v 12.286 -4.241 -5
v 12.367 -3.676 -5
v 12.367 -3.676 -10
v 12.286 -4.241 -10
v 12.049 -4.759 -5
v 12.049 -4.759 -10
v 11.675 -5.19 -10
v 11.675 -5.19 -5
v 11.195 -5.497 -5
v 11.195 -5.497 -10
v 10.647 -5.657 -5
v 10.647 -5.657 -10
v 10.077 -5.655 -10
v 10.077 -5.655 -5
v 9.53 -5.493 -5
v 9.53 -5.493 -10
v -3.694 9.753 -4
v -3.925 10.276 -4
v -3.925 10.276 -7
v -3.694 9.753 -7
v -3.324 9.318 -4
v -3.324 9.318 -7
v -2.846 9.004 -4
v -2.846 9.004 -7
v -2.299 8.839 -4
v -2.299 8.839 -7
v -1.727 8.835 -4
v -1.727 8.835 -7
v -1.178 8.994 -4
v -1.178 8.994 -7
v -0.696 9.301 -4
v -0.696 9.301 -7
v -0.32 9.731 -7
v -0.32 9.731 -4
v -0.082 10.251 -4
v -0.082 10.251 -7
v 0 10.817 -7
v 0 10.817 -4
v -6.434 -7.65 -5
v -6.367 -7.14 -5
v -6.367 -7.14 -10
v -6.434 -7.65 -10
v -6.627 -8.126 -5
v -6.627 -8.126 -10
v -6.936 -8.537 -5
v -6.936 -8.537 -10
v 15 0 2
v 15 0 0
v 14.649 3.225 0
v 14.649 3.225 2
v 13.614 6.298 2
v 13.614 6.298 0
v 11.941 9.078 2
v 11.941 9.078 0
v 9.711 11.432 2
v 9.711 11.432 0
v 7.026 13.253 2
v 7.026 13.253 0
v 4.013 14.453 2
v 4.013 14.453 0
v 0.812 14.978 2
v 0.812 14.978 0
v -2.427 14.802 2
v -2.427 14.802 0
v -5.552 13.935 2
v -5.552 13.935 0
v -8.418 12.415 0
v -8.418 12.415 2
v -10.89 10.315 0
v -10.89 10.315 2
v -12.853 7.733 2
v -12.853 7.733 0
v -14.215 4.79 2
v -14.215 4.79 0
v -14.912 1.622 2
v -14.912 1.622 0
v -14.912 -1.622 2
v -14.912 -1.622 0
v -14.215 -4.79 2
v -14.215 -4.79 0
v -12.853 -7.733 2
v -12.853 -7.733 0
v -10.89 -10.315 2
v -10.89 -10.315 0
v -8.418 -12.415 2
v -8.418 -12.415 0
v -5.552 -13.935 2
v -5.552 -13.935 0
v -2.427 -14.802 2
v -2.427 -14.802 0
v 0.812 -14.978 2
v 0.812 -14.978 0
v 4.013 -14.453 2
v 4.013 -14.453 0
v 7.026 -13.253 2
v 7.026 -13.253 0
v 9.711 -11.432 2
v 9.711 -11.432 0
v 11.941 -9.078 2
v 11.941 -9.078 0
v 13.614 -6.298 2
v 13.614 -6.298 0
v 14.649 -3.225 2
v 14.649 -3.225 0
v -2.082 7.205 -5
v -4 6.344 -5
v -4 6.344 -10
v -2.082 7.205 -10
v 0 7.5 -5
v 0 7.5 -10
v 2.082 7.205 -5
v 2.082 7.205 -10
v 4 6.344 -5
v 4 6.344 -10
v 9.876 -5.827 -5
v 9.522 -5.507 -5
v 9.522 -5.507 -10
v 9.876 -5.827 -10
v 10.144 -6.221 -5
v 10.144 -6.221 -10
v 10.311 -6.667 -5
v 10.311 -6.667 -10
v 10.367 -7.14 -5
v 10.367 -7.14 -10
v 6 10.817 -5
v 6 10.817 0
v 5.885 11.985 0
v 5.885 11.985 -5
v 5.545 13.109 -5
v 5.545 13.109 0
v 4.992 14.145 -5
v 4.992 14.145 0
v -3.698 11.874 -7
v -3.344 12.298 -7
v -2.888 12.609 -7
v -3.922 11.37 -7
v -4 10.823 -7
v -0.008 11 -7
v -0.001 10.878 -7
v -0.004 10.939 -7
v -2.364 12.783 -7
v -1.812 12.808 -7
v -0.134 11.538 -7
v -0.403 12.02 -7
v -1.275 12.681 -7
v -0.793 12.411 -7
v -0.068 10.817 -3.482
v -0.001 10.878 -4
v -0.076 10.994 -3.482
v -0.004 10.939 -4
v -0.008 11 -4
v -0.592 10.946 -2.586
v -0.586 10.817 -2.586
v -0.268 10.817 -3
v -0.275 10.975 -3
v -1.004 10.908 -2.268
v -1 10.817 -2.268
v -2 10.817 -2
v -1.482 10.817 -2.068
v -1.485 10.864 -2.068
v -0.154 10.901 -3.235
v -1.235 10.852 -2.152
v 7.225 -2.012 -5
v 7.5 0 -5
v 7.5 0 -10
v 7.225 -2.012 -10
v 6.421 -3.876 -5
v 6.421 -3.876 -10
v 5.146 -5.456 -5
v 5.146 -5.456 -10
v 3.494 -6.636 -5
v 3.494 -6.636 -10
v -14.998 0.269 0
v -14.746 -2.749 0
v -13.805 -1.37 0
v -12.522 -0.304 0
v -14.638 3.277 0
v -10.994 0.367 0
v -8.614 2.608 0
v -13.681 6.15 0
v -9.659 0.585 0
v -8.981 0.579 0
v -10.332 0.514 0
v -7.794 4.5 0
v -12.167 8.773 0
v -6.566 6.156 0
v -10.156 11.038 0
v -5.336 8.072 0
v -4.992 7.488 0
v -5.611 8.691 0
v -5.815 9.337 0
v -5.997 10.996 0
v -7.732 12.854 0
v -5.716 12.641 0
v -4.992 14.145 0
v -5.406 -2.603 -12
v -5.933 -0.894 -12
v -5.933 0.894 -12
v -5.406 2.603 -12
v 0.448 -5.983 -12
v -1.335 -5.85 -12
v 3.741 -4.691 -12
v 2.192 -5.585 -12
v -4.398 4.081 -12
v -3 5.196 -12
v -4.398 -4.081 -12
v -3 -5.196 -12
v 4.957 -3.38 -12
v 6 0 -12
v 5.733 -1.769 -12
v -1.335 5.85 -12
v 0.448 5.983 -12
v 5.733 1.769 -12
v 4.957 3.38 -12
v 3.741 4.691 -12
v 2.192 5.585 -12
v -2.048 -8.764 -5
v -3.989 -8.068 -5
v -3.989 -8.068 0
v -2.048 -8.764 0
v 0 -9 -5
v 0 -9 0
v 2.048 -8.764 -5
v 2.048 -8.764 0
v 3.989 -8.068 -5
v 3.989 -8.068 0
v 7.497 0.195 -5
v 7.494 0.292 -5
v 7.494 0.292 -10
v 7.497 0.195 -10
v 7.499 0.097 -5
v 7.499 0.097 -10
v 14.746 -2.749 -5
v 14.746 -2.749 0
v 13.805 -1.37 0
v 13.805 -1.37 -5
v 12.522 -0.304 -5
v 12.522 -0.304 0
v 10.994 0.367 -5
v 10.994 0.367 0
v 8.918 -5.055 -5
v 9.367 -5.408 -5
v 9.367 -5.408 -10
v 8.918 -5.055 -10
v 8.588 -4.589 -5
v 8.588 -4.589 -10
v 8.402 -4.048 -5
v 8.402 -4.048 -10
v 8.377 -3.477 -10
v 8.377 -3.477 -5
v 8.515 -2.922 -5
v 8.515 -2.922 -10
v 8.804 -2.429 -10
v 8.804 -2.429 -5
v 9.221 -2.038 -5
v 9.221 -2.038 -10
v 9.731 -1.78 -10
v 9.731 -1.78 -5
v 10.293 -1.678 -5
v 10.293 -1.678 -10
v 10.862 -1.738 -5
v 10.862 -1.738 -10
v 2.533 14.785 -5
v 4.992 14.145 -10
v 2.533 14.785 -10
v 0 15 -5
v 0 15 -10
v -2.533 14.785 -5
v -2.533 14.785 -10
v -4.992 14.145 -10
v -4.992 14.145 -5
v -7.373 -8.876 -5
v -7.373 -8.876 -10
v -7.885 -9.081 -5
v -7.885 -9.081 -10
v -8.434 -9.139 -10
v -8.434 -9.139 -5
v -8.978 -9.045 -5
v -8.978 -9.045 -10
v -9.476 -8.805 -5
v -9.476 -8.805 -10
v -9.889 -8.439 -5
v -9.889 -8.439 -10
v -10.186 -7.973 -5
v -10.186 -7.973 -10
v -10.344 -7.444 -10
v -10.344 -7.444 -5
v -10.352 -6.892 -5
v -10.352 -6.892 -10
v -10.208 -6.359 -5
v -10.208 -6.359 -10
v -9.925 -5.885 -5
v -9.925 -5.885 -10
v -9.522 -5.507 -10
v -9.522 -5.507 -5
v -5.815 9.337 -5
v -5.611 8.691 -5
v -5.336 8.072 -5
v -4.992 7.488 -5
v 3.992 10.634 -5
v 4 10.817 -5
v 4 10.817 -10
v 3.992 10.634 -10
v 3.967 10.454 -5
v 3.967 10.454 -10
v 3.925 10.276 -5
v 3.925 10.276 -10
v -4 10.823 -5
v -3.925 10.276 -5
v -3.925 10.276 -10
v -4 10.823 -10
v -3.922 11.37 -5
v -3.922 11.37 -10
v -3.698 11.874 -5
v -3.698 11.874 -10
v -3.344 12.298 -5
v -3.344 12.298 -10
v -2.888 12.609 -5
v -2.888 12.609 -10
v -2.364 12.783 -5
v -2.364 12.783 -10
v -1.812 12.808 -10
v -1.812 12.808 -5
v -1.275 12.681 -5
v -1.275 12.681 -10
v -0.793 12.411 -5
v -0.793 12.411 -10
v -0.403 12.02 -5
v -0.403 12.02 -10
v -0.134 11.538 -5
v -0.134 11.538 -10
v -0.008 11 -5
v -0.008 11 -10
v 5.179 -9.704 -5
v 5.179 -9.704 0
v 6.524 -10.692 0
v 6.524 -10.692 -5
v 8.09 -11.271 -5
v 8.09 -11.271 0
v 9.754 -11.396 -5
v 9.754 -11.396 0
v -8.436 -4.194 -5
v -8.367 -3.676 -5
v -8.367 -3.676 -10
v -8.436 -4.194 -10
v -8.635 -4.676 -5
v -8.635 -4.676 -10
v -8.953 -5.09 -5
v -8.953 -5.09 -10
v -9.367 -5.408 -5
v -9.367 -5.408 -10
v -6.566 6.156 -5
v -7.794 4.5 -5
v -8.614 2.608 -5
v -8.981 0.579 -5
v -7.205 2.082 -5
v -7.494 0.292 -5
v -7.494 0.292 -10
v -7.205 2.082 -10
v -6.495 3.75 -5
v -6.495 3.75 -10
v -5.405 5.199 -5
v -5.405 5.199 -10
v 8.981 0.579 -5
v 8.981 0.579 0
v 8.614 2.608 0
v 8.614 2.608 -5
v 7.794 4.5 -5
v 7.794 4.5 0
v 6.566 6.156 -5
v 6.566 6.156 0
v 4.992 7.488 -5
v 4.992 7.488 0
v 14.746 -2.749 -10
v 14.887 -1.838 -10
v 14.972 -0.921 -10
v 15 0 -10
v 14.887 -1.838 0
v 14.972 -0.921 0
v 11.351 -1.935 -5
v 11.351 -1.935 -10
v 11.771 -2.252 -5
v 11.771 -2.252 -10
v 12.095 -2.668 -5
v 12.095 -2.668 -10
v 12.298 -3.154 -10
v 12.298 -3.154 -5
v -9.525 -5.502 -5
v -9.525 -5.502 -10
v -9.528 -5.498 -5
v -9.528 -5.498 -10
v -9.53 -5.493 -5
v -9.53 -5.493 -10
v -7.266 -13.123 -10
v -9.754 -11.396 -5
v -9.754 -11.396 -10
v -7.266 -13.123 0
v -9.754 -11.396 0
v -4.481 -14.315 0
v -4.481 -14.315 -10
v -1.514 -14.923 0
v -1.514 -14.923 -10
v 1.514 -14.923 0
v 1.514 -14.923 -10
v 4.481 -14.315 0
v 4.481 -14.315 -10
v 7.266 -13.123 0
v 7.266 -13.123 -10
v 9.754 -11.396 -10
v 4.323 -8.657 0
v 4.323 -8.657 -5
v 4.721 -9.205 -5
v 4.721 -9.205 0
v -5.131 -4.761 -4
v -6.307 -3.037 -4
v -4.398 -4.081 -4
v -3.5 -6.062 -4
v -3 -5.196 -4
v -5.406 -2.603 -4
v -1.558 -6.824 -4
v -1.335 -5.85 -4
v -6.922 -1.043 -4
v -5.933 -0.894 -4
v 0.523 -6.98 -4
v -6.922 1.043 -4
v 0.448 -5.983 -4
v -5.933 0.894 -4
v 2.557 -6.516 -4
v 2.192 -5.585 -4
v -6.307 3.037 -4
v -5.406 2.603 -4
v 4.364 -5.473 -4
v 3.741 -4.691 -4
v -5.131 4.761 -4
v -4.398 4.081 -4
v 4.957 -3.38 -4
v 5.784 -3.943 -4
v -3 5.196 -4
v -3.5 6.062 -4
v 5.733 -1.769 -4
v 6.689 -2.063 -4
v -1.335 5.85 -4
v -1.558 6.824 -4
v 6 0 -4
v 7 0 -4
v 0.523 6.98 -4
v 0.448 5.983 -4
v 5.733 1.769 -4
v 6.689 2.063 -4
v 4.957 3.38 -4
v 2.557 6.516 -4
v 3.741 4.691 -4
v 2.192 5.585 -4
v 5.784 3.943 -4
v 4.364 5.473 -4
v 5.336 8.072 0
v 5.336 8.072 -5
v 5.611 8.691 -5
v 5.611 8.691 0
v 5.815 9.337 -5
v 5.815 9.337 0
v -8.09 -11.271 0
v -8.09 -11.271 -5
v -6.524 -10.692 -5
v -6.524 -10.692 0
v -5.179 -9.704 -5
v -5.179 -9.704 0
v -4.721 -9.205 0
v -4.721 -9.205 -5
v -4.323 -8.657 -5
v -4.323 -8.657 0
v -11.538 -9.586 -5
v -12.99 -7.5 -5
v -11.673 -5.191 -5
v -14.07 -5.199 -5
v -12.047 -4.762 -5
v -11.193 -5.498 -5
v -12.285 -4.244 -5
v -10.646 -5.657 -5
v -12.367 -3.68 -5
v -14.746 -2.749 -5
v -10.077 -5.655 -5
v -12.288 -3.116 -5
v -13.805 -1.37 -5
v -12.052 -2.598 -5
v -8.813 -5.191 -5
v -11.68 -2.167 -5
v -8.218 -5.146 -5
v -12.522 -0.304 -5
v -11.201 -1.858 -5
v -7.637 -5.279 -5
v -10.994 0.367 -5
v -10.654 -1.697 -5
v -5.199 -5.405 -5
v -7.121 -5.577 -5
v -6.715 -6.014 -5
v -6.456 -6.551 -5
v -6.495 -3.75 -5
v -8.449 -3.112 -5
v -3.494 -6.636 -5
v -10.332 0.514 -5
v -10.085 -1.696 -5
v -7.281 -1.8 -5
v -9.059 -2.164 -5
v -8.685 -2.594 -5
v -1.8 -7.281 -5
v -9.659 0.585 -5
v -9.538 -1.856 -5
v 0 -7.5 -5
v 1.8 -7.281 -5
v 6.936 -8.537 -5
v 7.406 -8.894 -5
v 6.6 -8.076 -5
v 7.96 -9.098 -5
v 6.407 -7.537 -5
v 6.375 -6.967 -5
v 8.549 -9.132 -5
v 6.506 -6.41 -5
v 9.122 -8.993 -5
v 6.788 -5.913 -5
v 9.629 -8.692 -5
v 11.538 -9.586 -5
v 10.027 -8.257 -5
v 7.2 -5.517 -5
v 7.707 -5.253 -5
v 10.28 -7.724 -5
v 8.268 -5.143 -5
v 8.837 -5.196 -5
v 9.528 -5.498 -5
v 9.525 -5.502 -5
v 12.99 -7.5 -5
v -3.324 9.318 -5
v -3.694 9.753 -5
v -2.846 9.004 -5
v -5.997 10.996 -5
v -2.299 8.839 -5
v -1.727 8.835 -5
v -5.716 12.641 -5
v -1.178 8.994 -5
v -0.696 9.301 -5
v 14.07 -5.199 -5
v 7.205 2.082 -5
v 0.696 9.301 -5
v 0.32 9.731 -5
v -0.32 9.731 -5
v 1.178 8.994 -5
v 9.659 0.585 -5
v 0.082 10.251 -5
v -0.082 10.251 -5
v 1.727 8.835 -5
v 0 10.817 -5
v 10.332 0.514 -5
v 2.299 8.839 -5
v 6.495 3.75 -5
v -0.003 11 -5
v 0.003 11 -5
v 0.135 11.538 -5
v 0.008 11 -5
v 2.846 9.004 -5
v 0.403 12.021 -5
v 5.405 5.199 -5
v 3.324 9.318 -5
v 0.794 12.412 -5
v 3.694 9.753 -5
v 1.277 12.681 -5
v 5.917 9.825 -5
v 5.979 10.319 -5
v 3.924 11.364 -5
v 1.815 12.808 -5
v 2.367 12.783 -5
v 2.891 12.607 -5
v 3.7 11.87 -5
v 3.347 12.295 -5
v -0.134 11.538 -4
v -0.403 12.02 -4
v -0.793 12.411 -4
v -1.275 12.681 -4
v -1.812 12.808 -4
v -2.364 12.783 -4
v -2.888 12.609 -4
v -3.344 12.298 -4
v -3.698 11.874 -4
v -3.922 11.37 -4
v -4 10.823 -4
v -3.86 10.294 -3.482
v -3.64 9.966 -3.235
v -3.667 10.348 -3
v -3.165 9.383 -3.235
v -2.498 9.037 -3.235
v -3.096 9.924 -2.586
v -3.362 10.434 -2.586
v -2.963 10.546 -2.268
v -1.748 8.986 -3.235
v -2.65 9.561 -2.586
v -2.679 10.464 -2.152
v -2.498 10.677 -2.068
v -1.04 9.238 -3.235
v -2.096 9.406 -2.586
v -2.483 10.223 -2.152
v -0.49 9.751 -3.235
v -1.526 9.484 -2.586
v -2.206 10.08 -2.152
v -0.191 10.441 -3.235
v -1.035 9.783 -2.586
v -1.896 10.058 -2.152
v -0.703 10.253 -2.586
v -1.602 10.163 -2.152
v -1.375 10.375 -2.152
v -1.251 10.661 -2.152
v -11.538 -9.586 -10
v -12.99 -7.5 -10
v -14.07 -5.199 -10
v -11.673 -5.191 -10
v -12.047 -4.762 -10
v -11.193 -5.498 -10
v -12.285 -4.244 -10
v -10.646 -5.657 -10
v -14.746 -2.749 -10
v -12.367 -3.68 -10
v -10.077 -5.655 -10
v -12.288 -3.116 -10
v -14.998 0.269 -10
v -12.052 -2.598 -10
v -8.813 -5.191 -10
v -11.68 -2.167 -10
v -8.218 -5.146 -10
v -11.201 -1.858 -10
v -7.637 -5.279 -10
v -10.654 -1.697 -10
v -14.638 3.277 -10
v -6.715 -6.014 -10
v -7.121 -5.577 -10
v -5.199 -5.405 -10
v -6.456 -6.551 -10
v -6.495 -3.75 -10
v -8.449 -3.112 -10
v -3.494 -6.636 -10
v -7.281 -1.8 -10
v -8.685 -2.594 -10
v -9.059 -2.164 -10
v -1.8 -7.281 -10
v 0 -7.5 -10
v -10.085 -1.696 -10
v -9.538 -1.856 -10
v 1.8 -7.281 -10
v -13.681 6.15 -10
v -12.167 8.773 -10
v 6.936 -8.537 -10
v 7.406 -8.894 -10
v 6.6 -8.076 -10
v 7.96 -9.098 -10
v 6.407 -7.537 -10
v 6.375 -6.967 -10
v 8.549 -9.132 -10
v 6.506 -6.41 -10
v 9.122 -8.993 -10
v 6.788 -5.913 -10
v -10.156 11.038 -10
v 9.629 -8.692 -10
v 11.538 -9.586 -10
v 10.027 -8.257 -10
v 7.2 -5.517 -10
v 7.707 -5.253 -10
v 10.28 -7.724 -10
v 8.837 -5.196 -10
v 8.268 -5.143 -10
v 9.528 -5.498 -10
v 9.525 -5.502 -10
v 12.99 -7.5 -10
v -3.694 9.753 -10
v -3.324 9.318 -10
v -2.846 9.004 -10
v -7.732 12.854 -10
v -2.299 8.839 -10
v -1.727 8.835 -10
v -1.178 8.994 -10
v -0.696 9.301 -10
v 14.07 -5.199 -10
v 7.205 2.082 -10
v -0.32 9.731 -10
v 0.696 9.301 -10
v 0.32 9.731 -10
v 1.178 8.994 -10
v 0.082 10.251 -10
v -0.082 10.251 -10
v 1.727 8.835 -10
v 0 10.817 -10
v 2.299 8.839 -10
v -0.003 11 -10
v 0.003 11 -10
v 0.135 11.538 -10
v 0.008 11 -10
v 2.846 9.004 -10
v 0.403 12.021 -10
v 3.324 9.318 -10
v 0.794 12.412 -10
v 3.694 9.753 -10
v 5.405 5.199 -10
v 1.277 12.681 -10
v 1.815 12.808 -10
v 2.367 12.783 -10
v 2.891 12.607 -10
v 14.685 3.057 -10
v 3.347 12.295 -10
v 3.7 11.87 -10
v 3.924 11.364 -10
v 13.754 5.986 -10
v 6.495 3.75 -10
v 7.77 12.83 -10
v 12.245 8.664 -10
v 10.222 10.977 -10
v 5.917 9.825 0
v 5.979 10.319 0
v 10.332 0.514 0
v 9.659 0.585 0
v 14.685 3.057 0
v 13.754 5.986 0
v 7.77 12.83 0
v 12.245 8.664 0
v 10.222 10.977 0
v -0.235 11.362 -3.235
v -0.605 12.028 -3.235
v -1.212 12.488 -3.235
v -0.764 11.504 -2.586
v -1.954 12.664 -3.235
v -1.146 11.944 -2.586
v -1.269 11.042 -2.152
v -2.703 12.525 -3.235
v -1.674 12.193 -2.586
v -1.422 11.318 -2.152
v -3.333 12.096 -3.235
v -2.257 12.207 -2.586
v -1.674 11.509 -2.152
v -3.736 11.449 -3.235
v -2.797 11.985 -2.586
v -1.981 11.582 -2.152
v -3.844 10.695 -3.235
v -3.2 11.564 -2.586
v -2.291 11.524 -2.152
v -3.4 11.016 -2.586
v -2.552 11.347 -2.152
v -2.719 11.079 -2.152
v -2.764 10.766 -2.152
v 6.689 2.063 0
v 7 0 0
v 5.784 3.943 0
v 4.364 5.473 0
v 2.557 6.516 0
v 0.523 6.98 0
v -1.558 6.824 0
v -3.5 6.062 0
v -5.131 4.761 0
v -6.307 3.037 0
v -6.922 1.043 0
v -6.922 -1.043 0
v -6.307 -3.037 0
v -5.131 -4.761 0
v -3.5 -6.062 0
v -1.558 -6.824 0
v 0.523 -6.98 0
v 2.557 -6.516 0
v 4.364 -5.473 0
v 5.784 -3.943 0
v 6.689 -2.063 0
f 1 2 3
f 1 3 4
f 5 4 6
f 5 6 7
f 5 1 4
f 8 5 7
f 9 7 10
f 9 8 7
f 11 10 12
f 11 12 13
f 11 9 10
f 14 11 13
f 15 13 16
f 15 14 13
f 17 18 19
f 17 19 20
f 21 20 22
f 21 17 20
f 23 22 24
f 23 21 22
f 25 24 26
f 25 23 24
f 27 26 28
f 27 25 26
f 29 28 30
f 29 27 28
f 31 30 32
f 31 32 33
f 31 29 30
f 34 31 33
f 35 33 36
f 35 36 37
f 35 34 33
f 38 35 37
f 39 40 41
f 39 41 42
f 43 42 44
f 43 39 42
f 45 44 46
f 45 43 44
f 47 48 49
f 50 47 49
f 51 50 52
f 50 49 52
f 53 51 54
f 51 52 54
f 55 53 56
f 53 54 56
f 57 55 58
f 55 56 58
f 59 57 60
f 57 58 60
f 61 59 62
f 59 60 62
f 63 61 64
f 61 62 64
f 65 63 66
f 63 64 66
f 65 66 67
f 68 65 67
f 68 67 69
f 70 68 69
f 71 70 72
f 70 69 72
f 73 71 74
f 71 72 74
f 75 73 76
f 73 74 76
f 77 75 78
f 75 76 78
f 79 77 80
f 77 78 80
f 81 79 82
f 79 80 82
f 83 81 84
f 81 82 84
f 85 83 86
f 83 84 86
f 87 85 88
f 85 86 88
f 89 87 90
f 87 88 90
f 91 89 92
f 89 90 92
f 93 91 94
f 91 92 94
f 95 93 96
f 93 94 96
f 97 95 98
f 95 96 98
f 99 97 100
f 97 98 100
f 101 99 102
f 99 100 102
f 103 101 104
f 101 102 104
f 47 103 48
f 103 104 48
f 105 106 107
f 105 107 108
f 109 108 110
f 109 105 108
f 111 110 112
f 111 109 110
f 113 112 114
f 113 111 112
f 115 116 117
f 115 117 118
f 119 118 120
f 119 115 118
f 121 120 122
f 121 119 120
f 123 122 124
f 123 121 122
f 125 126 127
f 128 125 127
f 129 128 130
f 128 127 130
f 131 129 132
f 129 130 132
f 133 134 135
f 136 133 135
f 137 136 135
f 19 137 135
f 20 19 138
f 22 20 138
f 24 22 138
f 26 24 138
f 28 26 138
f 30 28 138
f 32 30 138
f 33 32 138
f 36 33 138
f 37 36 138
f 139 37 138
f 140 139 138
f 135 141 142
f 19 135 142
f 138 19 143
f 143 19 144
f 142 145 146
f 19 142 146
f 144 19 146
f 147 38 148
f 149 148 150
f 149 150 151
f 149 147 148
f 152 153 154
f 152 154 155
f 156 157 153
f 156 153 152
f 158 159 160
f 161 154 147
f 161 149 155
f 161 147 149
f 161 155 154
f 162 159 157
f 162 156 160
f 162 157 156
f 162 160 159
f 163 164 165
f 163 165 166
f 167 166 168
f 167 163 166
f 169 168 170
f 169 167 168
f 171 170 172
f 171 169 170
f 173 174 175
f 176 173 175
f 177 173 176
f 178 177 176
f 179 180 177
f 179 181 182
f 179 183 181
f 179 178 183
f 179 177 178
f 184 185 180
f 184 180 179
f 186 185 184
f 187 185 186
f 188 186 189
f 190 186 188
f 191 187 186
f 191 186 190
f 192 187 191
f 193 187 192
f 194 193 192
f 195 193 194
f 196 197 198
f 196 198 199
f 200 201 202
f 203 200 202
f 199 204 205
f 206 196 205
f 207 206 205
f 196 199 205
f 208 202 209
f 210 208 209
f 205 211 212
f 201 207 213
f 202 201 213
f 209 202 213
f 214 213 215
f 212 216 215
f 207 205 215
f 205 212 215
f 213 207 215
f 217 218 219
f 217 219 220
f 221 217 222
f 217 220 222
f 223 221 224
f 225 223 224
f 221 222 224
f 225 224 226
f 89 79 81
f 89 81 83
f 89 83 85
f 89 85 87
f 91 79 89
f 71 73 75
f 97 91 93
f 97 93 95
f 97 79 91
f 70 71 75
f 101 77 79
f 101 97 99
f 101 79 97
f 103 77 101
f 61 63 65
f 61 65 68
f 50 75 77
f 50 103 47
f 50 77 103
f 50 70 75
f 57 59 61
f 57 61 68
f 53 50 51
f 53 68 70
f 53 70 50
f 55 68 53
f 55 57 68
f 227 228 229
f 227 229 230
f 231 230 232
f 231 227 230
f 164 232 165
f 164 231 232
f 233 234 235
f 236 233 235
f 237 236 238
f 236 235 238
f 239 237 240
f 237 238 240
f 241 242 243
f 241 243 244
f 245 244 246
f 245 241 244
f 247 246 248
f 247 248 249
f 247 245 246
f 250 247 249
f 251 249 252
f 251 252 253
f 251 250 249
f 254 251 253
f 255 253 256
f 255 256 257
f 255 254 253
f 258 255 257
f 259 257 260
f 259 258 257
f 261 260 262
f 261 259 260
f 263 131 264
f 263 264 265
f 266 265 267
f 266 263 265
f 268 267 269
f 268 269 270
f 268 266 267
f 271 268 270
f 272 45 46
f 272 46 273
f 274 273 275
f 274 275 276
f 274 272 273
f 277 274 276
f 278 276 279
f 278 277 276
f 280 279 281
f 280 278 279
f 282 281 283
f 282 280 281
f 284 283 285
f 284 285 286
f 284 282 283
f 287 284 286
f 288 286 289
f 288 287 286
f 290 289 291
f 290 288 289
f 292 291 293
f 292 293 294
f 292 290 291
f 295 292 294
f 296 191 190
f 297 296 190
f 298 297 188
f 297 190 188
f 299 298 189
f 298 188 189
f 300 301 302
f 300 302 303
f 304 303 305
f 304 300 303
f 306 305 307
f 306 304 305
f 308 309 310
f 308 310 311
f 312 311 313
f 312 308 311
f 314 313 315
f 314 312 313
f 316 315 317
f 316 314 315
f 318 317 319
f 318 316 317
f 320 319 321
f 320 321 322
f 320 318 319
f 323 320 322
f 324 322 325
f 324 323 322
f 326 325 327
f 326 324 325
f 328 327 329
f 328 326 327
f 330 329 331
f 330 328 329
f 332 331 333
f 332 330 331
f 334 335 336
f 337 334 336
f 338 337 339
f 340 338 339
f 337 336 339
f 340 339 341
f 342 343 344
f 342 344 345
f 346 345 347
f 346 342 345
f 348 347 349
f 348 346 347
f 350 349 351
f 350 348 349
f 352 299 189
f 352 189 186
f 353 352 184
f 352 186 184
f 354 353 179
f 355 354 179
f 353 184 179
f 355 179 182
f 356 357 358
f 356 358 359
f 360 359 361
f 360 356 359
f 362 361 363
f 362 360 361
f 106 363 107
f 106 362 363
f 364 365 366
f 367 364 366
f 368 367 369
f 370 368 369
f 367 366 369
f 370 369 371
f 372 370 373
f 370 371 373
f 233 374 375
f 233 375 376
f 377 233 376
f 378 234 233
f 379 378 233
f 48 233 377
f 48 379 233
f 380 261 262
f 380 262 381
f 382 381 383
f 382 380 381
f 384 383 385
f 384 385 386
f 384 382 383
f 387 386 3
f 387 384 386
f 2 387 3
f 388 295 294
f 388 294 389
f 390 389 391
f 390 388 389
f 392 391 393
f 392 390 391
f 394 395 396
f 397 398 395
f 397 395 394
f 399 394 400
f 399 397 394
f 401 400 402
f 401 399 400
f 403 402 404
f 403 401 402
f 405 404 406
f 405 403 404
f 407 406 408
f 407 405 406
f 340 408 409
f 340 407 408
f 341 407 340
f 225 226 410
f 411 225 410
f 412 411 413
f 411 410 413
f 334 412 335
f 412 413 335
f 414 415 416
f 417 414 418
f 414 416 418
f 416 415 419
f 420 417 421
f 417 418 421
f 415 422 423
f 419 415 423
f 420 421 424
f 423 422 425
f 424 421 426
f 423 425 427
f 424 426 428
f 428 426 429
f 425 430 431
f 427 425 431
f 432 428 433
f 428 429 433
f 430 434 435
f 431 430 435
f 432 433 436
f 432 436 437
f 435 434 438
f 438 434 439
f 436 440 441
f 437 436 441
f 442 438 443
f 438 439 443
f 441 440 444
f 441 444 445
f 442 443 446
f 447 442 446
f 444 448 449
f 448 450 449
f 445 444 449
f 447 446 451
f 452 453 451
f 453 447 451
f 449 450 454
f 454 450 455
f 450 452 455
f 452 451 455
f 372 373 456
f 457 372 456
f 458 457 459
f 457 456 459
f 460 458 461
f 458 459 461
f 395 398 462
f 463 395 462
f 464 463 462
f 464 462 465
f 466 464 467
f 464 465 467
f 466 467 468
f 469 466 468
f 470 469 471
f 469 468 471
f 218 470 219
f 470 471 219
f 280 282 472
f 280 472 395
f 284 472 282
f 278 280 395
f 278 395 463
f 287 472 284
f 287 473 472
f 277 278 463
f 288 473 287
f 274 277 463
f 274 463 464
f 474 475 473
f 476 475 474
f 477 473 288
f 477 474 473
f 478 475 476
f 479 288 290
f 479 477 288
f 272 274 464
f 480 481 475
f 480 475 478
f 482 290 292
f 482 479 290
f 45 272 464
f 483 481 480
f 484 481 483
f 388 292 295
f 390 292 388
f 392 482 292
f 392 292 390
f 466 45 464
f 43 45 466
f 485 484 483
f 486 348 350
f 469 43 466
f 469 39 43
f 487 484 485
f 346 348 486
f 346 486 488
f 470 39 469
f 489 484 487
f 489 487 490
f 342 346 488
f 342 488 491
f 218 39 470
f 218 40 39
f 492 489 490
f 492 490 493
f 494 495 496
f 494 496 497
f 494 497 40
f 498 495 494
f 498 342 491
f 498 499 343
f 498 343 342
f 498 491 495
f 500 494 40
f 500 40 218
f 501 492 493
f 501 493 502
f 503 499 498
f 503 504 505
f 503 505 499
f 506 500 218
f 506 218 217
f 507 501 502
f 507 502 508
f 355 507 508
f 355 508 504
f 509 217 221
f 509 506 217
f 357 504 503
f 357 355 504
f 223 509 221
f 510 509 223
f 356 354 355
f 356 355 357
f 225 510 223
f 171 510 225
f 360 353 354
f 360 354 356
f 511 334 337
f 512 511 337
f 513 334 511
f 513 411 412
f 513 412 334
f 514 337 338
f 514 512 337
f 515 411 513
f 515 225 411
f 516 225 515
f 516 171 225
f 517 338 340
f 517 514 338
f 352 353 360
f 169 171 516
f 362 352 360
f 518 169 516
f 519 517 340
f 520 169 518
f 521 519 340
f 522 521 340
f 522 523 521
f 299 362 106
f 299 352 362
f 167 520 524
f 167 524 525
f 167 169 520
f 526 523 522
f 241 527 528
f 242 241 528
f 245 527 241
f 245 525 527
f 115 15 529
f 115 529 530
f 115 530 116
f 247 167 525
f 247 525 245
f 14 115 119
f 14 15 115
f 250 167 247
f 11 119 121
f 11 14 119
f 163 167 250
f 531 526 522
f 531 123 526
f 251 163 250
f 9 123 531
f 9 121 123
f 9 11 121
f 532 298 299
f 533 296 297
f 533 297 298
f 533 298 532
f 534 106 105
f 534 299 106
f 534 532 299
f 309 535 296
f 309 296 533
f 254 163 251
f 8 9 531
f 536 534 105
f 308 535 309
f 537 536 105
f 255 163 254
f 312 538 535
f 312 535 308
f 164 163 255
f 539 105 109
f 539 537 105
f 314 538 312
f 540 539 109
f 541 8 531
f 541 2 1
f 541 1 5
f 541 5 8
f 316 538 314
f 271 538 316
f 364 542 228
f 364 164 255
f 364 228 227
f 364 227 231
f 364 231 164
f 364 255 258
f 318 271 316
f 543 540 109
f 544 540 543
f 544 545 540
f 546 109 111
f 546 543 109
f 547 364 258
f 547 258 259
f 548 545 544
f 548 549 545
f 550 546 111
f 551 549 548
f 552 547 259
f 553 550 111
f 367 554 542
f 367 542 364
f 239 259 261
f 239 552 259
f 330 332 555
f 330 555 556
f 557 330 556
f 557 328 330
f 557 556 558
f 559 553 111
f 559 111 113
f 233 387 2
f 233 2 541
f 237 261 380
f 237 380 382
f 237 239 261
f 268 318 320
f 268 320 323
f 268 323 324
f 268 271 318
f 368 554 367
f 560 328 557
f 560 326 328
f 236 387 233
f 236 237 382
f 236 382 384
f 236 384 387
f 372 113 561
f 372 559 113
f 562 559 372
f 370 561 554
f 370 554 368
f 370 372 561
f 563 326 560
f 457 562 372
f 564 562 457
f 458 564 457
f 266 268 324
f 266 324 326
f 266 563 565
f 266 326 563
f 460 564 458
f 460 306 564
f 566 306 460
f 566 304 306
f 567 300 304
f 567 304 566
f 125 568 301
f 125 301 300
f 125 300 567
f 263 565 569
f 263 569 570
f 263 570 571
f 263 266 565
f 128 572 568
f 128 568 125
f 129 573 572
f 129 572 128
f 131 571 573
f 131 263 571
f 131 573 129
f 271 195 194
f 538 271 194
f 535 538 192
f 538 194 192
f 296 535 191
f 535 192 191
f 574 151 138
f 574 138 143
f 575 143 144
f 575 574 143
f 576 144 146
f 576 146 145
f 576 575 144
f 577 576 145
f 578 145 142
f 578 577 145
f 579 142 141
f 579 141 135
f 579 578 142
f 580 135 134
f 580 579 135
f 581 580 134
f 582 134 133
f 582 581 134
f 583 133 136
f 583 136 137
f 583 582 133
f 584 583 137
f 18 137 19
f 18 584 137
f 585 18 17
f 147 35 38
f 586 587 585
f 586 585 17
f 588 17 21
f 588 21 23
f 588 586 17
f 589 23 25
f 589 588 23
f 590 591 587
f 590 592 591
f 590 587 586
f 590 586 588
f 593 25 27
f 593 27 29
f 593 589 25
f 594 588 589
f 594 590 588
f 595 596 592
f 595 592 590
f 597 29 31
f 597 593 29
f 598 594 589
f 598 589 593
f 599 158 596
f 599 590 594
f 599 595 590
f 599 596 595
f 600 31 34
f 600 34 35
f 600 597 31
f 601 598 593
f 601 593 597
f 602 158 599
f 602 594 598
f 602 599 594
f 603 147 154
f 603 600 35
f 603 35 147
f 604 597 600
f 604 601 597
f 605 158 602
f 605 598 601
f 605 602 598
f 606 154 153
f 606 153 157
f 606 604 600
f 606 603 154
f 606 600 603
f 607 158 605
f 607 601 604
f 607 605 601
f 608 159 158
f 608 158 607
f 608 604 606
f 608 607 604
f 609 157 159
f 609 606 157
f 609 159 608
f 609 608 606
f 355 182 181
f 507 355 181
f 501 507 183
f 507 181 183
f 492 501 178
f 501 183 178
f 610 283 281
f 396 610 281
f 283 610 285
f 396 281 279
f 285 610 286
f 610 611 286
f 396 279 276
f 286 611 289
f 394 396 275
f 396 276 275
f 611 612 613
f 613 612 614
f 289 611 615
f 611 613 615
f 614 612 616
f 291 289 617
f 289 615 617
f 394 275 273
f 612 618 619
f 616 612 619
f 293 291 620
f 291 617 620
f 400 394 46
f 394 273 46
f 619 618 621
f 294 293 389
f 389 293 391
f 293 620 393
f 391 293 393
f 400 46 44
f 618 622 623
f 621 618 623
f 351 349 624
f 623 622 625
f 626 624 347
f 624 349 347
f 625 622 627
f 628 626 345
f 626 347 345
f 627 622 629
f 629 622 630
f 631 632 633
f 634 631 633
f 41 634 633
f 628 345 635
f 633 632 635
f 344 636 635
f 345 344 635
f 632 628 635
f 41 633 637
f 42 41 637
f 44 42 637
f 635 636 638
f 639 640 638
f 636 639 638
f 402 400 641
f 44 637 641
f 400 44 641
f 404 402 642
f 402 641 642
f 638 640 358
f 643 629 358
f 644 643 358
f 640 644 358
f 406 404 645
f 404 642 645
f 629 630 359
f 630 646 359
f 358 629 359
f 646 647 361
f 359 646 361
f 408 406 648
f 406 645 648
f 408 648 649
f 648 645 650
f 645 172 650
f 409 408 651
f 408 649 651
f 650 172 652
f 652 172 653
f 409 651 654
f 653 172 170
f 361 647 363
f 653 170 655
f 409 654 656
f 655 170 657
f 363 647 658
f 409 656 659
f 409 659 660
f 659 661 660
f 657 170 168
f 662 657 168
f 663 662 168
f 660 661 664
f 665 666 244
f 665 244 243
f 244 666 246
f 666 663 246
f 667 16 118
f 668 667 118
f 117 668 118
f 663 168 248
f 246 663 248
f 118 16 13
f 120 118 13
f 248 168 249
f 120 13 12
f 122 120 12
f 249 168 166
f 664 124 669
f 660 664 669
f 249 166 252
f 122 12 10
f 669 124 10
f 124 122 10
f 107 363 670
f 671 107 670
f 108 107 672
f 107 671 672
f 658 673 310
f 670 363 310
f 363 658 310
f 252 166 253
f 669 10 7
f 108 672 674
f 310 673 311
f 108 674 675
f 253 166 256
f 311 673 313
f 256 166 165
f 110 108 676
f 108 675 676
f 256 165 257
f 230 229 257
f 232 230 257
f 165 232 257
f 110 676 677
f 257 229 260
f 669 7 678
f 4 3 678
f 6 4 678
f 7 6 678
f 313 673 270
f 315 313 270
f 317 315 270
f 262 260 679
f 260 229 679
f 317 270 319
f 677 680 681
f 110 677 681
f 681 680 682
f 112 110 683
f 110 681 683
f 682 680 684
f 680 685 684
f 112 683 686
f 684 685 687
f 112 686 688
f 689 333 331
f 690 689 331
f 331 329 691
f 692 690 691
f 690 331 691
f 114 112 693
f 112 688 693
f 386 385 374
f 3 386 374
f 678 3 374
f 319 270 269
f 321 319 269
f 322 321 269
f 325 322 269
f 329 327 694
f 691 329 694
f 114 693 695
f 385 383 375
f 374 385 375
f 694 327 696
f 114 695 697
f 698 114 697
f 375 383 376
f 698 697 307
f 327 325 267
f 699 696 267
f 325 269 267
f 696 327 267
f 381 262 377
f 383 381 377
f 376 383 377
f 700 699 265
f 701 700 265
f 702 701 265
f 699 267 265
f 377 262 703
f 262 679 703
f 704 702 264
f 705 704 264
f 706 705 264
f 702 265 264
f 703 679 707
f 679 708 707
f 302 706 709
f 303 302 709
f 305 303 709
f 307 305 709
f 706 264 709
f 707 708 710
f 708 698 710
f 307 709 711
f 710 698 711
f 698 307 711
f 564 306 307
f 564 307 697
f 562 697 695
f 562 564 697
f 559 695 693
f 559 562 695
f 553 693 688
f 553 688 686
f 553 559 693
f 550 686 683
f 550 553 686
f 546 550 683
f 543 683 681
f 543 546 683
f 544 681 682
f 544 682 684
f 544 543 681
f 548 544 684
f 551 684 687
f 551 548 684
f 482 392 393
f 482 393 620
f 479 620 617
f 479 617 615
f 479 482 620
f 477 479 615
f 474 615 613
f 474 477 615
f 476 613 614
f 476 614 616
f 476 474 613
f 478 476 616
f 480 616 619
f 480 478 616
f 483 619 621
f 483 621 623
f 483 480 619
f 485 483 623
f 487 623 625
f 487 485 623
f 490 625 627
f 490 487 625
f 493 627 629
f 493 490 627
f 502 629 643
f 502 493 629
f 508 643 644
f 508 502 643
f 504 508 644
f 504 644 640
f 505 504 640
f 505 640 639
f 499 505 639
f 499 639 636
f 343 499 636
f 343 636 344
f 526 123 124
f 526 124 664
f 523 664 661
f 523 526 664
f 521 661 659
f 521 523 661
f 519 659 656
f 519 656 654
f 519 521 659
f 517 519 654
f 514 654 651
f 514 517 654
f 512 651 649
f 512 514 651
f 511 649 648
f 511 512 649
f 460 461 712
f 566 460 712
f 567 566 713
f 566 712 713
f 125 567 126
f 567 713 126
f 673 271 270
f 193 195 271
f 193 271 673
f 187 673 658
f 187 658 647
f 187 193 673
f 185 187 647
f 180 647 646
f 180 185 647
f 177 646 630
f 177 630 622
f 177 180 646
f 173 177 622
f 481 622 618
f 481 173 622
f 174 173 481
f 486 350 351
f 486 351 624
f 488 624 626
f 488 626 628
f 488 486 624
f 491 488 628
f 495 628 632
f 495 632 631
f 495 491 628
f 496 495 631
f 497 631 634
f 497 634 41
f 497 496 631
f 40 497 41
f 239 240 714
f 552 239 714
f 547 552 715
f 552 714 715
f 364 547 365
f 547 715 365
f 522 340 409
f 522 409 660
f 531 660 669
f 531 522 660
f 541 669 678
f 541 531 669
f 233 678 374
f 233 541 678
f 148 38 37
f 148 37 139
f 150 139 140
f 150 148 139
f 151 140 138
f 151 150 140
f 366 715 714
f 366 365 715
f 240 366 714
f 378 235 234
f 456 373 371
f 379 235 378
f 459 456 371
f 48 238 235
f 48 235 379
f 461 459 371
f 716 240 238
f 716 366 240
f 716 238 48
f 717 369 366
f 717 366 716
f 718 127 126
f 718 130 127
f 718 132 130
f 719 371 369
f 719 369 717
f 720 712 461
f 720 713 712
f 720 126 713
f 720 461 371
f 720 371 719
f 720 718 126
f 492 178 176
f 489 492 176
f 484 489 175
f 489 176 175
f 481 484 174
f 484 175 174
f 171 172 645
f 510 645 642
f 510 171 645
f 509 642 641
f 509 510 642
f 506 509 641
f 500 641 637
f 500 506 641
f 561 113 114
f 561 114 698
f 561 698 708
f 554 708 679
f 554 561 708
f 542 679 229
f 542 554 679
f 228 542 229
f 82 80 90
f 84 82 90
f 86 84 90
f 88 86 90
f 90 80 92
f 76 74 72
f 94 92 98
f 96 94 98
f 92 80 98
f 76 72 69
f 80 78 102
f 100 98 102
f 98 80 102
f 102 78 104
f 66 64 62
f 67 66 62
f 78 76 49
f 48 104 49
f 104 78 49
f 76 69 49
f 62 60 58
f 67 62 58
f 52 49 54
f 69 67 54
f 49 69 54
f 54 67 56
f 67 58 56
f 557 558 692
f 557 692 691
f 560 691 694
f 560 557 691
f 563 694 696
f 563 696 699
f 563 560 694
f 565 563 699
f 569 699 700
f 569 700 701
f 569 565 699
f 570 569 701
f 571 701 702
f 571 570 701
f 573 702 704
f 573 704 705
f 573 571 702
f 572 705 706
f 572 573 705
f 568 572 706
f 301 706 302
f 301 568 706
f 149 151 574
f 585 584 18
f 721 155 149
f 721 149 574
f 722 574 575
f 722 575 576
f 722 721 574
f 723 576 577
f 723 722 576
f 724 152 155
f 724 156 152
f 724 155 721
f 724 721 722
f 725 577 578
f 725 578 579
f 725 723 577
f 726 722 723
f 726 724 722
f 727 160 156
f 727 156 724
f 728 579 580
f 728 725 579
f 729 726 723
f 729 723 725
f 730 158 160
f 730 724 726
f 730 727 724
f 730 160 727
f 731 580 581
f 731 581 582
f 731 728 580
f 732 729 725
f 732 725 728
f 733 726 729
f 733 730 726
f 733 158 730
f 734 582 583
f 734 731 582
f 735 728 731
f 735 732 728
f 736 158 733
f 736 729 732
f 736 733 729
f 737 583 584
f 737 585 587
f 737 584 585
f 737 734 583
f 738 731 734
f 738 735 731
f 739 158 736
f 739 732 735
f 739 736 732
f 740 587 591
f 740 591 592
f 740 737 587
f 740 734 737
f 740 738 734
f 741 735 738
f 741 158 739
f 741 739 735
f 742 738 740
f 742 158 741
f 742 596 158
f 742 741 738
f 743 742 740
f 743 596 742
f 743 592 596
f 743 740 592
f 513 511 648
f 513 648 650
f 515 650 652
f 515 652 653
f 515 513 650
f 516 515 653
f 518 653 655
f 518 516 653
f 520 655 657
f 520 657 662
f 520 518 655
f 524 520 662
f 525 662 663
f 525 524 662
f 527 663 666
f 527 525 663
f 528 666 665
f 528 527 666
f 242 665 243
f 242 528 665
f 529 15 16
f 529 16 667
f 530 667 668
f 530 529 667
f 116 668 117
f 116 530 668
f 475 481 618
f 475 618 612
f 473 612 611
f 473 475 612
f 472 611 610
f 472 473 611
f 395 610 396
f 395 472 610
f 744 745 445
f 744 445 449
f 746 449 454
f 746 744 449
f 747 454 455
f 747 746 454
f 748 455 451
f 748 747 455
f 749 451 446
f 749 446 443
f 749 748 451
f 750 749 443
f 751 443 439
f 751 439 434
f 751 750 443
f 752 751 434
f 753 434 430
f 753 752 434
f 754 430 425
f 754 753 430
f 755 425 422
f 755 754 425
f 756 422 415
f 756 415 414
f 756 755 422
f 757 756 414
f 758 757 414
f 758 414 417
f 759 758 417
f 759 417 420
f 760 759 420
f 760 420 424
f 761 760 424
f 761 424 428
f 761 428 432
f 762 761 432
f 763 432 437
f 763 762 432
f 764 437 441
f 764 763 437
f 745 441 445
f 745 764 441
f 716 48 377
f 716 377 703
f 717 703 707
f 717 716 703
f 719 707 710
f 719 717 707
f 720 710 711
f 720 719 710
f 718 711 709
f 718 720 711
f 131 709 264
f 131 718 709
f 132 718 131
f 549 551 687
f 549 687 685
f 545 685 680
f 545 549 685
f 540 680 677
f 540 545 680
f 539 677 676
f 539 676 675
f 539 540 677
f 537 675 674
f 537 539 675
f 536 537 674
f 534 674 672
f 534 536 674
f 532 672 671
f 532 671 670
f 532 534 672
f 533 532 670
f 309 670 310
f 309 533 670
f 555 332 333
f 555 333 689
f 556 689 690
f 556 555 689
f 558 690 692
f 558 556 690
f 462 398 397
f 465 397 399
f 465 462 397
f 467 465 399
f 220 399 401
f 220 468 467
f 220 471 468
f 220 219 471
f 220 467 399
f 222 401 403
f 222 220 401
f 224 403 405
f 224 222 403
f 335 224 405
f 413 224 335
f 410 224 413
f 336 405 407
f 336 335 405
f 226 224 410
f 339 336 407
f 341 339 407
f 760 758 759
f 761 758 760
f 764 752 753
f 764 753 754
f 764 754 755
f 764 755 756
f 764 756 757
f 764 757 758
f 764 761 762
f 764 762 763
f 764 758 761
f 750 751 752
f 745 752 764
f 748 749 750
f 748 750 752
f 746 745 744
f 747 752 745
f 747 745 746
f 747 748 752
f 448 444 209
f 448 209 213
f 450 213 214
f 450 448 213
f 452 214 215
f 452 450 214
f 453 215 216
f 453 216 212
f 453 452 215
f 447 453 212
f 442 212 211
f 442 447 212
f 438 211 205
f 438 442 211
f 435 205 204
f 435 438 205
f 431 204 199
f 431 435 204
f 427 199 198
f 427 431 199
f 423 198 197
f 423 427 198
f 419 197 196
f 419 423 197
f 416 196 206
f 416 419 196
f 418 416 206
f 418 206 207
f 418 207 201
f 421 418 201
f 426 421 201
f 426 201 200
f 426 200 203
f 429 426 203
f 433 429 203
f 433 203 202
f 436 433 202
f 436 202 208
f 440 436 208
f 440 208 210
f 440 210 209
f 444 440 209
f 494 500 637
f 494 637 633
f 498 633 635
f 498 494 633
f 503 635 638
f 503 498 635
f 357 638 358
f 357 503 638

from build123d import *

# Parameters (mm, degrees)
F1_DEPTH = 10
F2_DEPTH = 5
F3_R     = 15
F4_DEPTH = 2
F5_R     = 6
F6_DEPTH = 12
F5_R_2   = 7
F7_DEPTH = 4
F5_R_3   = 9
F8_DEPTH = 5
F9_DEPTH = 5
F10_R    = 2


with BuildPart() as f1:
    # F0 (on Top) → F1 (new body)
    with BuildSketch(Plane.XY):
        with BuildLine():
            ThreePointArc((-9.7536528831, -11.3958876546), (0, -15), (9.7536528831, -11.3958876546))
            ThreePointArc((9.7536528831, -11.3958876546), (7.2867471777, -11.0359800819), (5.1790688964, -9.7044961418))
            ThreePointArc((5.1790688964, -9.7044961418), (0, -11), (-5.1790688964, -9.7044961418))
            ThreePointArc((-5.1790688964, -9.7044961418), (-7.2867471777, -11.0359800819), (-9.7536528831, -11.3958876546))
        make_face()
        with BuildLine():
            ThreePointArc((-10.9938746379, 0.3670428387), (-13.2008126954, -0.7925181259), (-14.7459546491, -2.7489673491))
            ThreePointArc((-14.7459546491, -2.7489673491), (-12.9903810568, -7.5), (-9.7536528831, -11.3958876546))
            ThreePointArc((-9.7536528831, -11.3958876546), (-7.2867471777, -11.0359800819), (-5.1790688964, -9.7044961418))
            ThreePointArc((-5.1790688964, -9.7044961418), (-6.0857340456, -9.1631785493), (-6.936316569, -8.5374183718))
            ThreePointArc((-6.936316569, -8.5374183718), (-9.8888600881, -8.4386282154), (-9.5220659552, -5.5072915252))
            ThreePointArc((-9.5220659552, -5.5072915252), (-9.5262794416, -5.5), (-9.5304873445, -5.4927052511))
            ThreePointArc((-9.5304873445, -5.4927052511), (-12.2524964517, -4.344689943), (-10.8617794772, -1.7383171715))
            ThreePointArc((-10.8617794772, -1.7383171715), (-10.9784124259, -0.6888110095), (-10.9938746379, 0.3670428387))
        make_face()
        with BuildLine():
            ThreePointArc((9.7536528831, -11.3958876546), (12.9903810568, -7.5), (14.7459546491, -2.7489673491))
            ThreePointArc((14.7459546491, -2.7489673491), (13.2008126954, -0.7925181259), (10.9938746379, 0.3670428387))
            ThreePointArc((10.9938746379, 0.3670428387), (10.9984685529, 0.1835469732), (11, 0))
            ThreePointArc((11, 0), (10.9653904228, -0.8719018726), (10.8617794772, -1.7383171715))
            ThreePointArc((10.8617794772, -1.7383171715), (11.946826754, -2.4491992864), (12.3674969976, -3.6762761056))
            ThreePointArc((12.3674969976, -3.6762761056), (11.4459172992, -5.3606186044), (9.5304873445, -5.4927052511))
            ThreePointArc((9.5304873445, -5.4927052511), (9.5262794416, -5.5), (9.5220659552, -5.5072915252))
            ThreePointArc((9.5220659552, -5.5072915252), (10.1436076241, -6.220904479), (10.3674969976, -7.1403777208))
            ThreePointArc((10.3674969976, -7.1403777208), (9.121698278, -8.9927222969), (6.936316569, -8.5374183718))
            ThreePointArc((6.936316569, -8.5374183718), (6.0857340456, -9.1631785493), (5.1790688964, -9.7044961418))
            ThreePointArc((5.1790688964, -9.7044961418), (7.2867471777, -11.0359800819), (9.7536528831, -11.3958876546))
        make_face()
        with BuildLine():
            ThreePointArc((14.7459546491, -2.7489673491), (14.9363536336, -1.3803405854), (15, 0))
            ThreePointArc((15, 0), (12.2450913939, 8.6635868296), (4.992301766, 14.1448550037))
            ThreePointArc((4.992301766, 14.1448550037), (5.7425521589, 12.5553587185), (6, 10.8166538264))
            ThreePointArc((6, 10.8166538264), (5.9535214138, 10.0712795745), (5.8148057416, 9.3374533031))
            ThreePointArc((5.8148057416, 9.3374533031), (9.5262794416, 5.5), (10.9938746379, 0.3670428387))
            ThreePointArc((10.9938746379, 0.3670428387), (13.2008126954, -0.7925181259), (14.7459546491, -2.7489673491))
        make_face()
        with BuildLine():
            ThreePointArc((6, 10.8166538264), (5.7425521589, 12.5553587185), (4.992301766, 14.1448550037))
            ThreePointArc((4.992301766, 14.1448550037), (0, 15), (-4.992301766, 14.1448550037))
            ThreePointArc((-4.992301766, 14.1448550037), (-5.9140655177, 11.8284982078), (-5.8148057416, 9.3374533031))
            ThreePointArc((-5.8148057416, 9.3374533031), (-4.8926783803, 9.8519895588), (-3.9254629082, 10.2757355433))
            ThreePointArc((-3.9254629082, 10.2757355433), (-2.3636363636, 12.7833181585), (-0.0084213893, 10.9999967764))
            ThreePointArc((-0.0084213893, 10.9999967764), (0, 11), (0.0084213893, 10.9999967764))
            ThreePointArc((0.0084213893, 10.9999967764), (2.0917681278, 12.8145473698), (4, 10.8166538264))
            ThreePointArc((4, 10.8166538264), (3.9812780997, 10.5436390067), (3.9254629082, 10.2757355433))
            ThreePointArc((3.9254629082, 10.2757355433), (4.8926783803, 9.8519895588), (5.8148057416, 9.3374533031))
            ThreePointArc((5.8148057416, 9.3374533031), (5.9535214138, 10.0712795745), (6, 10.8166538264))
        make_face()
        with BuildLine():
            ThreePointArc((-5.8148057416, 9.3374533031), (-5.9140655177, 11.8284982078), (-4.992301766, 14.1448550037))
            ThreePointArc((-4.992301766, 14.1448550037), (-12.9903810568, 7.5), (-14.7459546491, -2.7489673491))
            ThreePointArc((-14.7459546491, -2.7489673491), (-13.2008126954, -0.7925181259), (-10.9938746379, 0.3670428387))
            ThreePointArc((-10.9938746379, 0.3670428387), (-9.5262794416, 5.5), (-5.8148057416, 9.3374533031))
        make_face()
        with BuildLine():
            ThreePointArc((-5.1790688964, -9.7044961418), (0, -11), (5.1790688964, -9.7044961418))
            ThreePointArc((5.1790688964, -9.7044961418), (4.1080412943, -8.2959082031), (3.494472399, -6.6361632479))
            ThreePointArc((3.494472399, -6.6361632479), (0, -7.5), (-3.494472399, -6.6361632479))
            ThreePointArc((-3.494472399, -6.6361632479), (-4.1080412943, -8.2959082031), (-5.1790688964, -9.7044961418))
        make_face()
        with BuildLine():
            ThreePointArc((7.4943221558, 0.2917797535), (9.2384878985, 0.5902859808), (10.9938746379, 0.3670428387))
            ThreePointArc((10.9938746379, 0.3670428387), (9.5262794416, 5.5), (5.8148057416, 9.3374533031))
            ThreePointArc((5.8148057416, 9.3374533031), (5.1304466041, 7.7056222222), (3.9998497568, 6.3443834943))
            ThreePointArc((3.9998497568, 6.3443834943), (6.4951905284, 3.75), (7.4943221558, 0.2917797535))
        make_face()
        with BuildLine():
            ThreePointArc((-3.9998497568, 6.3443834943), (-5.1304466041, 7.7056222222), (-5.8148057416, 9.3374533031))
            ThreePointArc((-5.8148057416, 9.3374533031), (-9.5262794416, 5.5), (-10.9938746379, 0.3670428387))
            ThreePointArc((-10.9938746379, 0.3670428387), (-9.2384878985, 0.5902859808), (-7.4943221558, 0.2917797535))
            ThreePointArc((-7.4943221558, 0.2917797535), (-6.4951905284, 3.75), (-3.9998497568, 6.3443834943))
        make_face()
        with BuildLine():
            ThreePointArc((-3.9254629082, 10.2757355433), (-4.8926783803, 9.8519895588), (-5.8148057416, 9.3374533031))
            ThreePointArc((-5.8148057416, 9.3374533031), (-5.1304466041, 7.7056222222), (-3.9998497568, 6.3443834943))
            ThreePointArc((-3.9998497568, 6.3443834943), (0, 7.5), (3.9998497568, 6.3443834943))
            ThreePointArc((3.9998497568, 6.3443834943), (5.1304466041, 7.7056222222), (5.8148057416, 9.3374533031))
            ThreePointArc((5.8148057416, 9.3374533031), (4.8926783803, 9.8519895588), (3.9254629082, 10.2757355433))
            ThreePointArc((3.9254629082, 10.2757355433), (1.7269851803, 8.8353757267), (0, 10.8166538264))
            ThreePointArc((0, 10.8166538264), (-1.7269851803, 8.8353757267), (-3.9254629082, 10.2757355433))
        make_face()
        with BuildLine():
            ThreePointArc((11, 0), (10.9984685529, 0.1835469732), (10.9938746379, 0.3670428387))
            ThreePointArc((10.9938746379, 0.3670428387), (9.2384878985, 0.5902859808), (7.4943221558, 0.2917797535))
            ThreePointArc((7.4943221558, 0.2917797535), (7.4985804046, 0.1459174959), (7.5, 0))
            ThreePointArc((7.5, 0), (6.4210023747, -3.8756584606), (3.494472399, -6.6361632479))
            ThreePointArc((3.494472399, -6.6361632479), (4.1080412943, -8.2959082031), (5.1790688964, -9.7044961418))
            ThreePointArc((5.1790688964, -9.7044961418), (6.0857340456, -9.1631785493), (6.936316569, -8.5374183718))
            ThreePointArc((6.936316569, -8.5374183718), (6.7881672455, -5.9133008959), (9.3674970098, -5.4083269203))
            ThreePointArc((9.3674970098, -5.4083269203), (8.5151524188, -2.9220748318), (10.8617794772, -1.7383171715))
            ThreePointArc((10.8617794772, -1.7383171715), (10.9653904228, -0.8719018726), (11, 0))
        make_face()
        with BuildLine():
            ThreePointArc((-7.4943221558, 0.2917797535), (-9.2384878985, 0.5902859808), (-10.9938746379, 0.3670428387))
            ThreePointArc((-10.9938746379, 0.3670428387), (-10.9784124259, -0.6888110095), (-10.8617794772, -1.7383171715))
            ThreePointArc((-10.8617794772, -1.7383171715), (-9.1404201783, -2.0969463492), (-8.3674969976, -3.6762761056))
            ThreePointArc((-8.3674969976, -3.6762761056), (-8.6354461825, -4.6762760926), (-9.3674969715, -5.4083268981))
            ThreePointArc((-9.3674969715, -5.4083268981), (-7.3674969846, -5.4083269207), (-6.3674969976, -7.1403777208))
            ThreePointArc((-6.3674969976, -7.1403777208), (-6.5151524215, -7.8945790012), (-6.936316569, -8.5374183718))
            ThreePointArc((-6.936316569, -8.5374183718), (-6.0857340456, -9.1631785493), (-5.1790688964, -9.7044961418))
            ThreePointArc((-5.1790688964, -9.7044961418), (-4.1080412943, -8.2959082031), (-3.494472399, -6.6361632479))
            ThreePointArc((-3.494472399, -6.6361632479), (-6.4951905284, -3.75), (-7.4943221558, 0.2917797535))
        make_face()
    extrude(amount=-F1_DEPTH)

    # F0 (on Top) → F2 (cut)
    with BuildSketch(Plane.XY):
        with BuildLine():
            ThreePointArc((-3.9254629082, 10.2757355433), (-4.8926783803, 9.8519895588), (-5.8148057416, 9.3374533031))
            ThreePointArc((-5.8148057416, 9.3374533031), (-5.1304466041, 7.7056222222), (-3.9998497568, 6.3443834943))
            ThreePointArc((-3.9998497568, 6.3443834943), (0, 7.5), (3.9998497568, 6.3443834943))
            ThreePointArc((3.9998497568, 6.3443834943), (5.1304466041, 7.7056222222), (5.8148057416, 9.3374533031))
            ThreePointArc((5.8148057416, 9.3374533031), (4.8926783803, 9.8519895588), (3.9254629082, 10.2757355433))
            ThreePointArc((3.9254629082, 10.2757355433), (1.7269851803, 8.8353757267), (0, 10.8166538264))
            ThreePointArc((0, 10.8166538264), (-1.7269851803, 8.8353757267), (-3.9254629082, 10.2757355433))
        make_face()
        with BuildLine():
            ThreePointArc((6, 10.8166538264), (5.7425521589, 12.5553587185), (4.992301766, 14.1448550037))
            ThreePointArc((4.992301766, 14.1448550037), (0, 15), (-4.992301766, 14.1448550037))
            ThreePointArc((-4.992301766, 14.1448550037), (-5.9140655177, 11.8284982078), (-5.8148057416, 9.3374533031))
            ThreePointArc((-5.8148057416, 9.3374533031), (-4.8926783803, 9.8519895588), (-3.9254629082, 10.2757355433))
            ThreePointArc((-3.9254629082, 10.2757355433), (-2.3636363636, 12.7833181585), (-0.0084213893, 10.9999967764))
            ThreePointArc((-0.0084213893, 10.9999967764), (0, 11), (0.0084213893, 10.9999967764))
            ThreePointArc((0.0084213893, 10.9999967764), (2.0917681278, 12.8145473698), (4, 10.8166538264))
            ThreePointArc((4, 10.8166538264), (3.9812780997, 10.5436390067), (3.9254629082, 10.2757355433))
            ThreePointArc((3.9254629082, 10.2757355433), (4.8926783803, 9.8519895588), (5.8148057416, 9.3374533031))
            ThreePointArc((5.8148057416, 9.3374533031), (5.9535214138, 10.0712795745), (6, 10.8166538264))
        make_face()
        with BuildLine():
            ThreePointArc((-7.4943221558, 0.2917797535), (-9.2384878985, 0.5902859808), (-10.9938746379, 0.3670428387))
            ThreePointArc((-10.9938746379, 0.3670428387), (-10.9784124259, -0.6888110095), (-10.8617794772, -1.7383171715))
            ThreePointArc((-10.8617794772, -1.7383171715), (-9.1404201783, -2.0969463492), (-8.3674969976, -3.6762761056))
            ThreePointArc((-8.3674969976, -3.6762761056), (-8.6354461825, -4.6762760926), (-9.3674969715, -5.4083268981))
            ThreePointArc((-9.3674969715, -5.4083268981), (-7.3674969846, -5.4083269207), (-6.3674969976, -7.1403777208))
            ThreePointArc((-6.3674969976, -7.1403777208), (-6.5151524215, -7.8945790012), (-6.936316569, -8.5374183718))
            ThreePointArc((-6.936316569, -8.5374183718), (-6.0857340456, -9.1631785493), (-5.1790688964, -9.7044961418))
            ThreePointArc((-5.1790688964, -9.7044961418), (-4.1080412943, -8.2959082031), (-3.494472399, -6.6361632479))
            ThreePointArc((-3.494472399, -6.6361632479), (-6.4951905284, -3.75), (-7.4943221558, 0.2917797535))
        make_face()
        with BuildLine():
            ThreePointArc((-10.9938746379, 0.3670428387), (-13.2008126954, -0.7925181259), (-14.7459546491, -2.7489673491))
            ThreePointArc((-14.7459546491, -2.7489673491), (-12.9903810568, -7.5), (-9.7536528831, -11.3958876546))
            ThreePointArc((-9.7536528831, -11.3958876546), (-7.2867471777, -11.0359800819), (-5.1790688964, -9.7044961418))
            ThreePointArc((-5.1790688964, -9.7044961418), (-6.0857340456, -9.1631785493), (-6.936316569, -8.5374183718))
            ThreePointArc((-6.936316569, -8.5374183718), (-9.8888600881, -8.4386282154), (-9.5220659552, -5.5072915252))
            ThreePointArc((-9.5220659552, -5.5072915252), (-9.5262794416, -5.5), (-9.5304873445, -5.4927052511))
            ThreePointArc((-9.5304873445, -5.4927052511), (-12.2524964517, -4.344689943), (-10.8617794772, -1.7383171715))
            ThreePointArc((-10.8617794772, -1.7383171715), (-10.9784124259, -0.6888110095), (-10.9938746379, 0.3670428387))
        make_face()
        with BuildLine():
            ThreePointArc((11, 0), (10.9984685529, 0.1835469732), (10.9938746379, 0.3670428387))
            ThreePointArc((10.9938746379, 0.3670428387), (9.2384878985, 0.5902859808), (7.4943221558, 0.2917797535))
            ThreePointArc((7.4943221558, 0.2917797535), (7.4985804046, 0.1459174959), (7.5, 0))
            ThreePointArc((7.5, 0), (6.4210023747, -3.8756584606), (3.494472399, -6.6361632479))
            ThreePointArc((3.494472399, -6.6361632479), (4.1080412943, -8.2959082031), (5.1790688964, -9.7044961418))
            ThreePointArc((5.1790688964, -9.7044961418), (6.0857340456, -9.1631785493), (6.936316569, -8.5374183718))
            ThreePointArc((6.936316569, -8.5374183718), (6.7881672455, -5.9133008959), (9.3674970098, -5.4083269203))
            ThreePointArc((9.3674970098, -5.4083269203), (8.5151524188, -2.9220748318), (10.8617794772, -1.7383171715))
            ThreePointArc((10.8617794772, -1.7383171715), (10.9653904228, -0.8719018726), (11, 0))
        make_face()
        with BuildLine():
            ThreePointArc((9.7536528831, -11.3958876546), (12.9903810568, -7.5), (14.7459546491, -2.7489673491))
            ThreePointArc((14.7459546491, -2.7489673491), (13.2008126954, -0.7925181259), (10.9938746379, 0.3670428387))
            ThreePointArc((10.9938746379, 0.3670428387), (10.9984685529, 0.1835469732), (11, 0))
            ThreePointArc((11, 0), (10.9653904228, -0.8719018726), (10.8617794772, -1.7383171715))
            ThreePointArc((10.8617794772, -1.7383171715), (11.946826754, -2.4491992864), (12.3674969976, -3.6762761056))
            ThreePointArc((12.3674969976, -3.6762761056), (11.4459172992, -5.3606186044), (9.5304873445, -5.4927052511))
            ThreePointArc((9.5304873445, -5.4927052511), (9.5262794416, -5.5), (9.5220659552, -5.5072915252))
            ThreePointArc((9.5220659552, -5.5072915252), (10.1436076241, -6.220904479), (10.3674969976, -7.1403777208))
            ThreePointArc((10.3674969976, -7.1403777208), (9.121698278, -8.9927222969), (6.936316569, -8.5374183718))
            ThreePointArc((6.936316569, -8.5374183718), (6.0857340456, -9.1631785493), (5.1790688964, -9.7044961418))
            ThreePointArc((5.1790688964, -9.7044961418), (7.2867471777, -11.0359800819), (9.7536528831, -11.3958876546))
        make_face()
    extrude(amount=-F2_DEPTH, mode=Mode.SUBTRACT)

    # F5 (on Top) → F8 (cut)
    with BuildSketch(Plane.XY):
        Circle(F5_R_3)
        Circle(F5_R_2, mode=Mode.SUBTRACT)
    extrude(amount=-F8_DEPTH, mode=Mode.SUBTRACT)


with BuildPart() as f4:
    # F3 (on face) → F4 (new body)
    with BuildSketch(Plane.XY):
        Circle(F3_R)
    extrude(amount=F4_DEPTH)


with BuildPart() as f6:
    # F5 (on Top) → F6 (new body)
    with BuildSketch(Plane.XY):
        Circle(F5_R)
    extrude(amount=-F6_DEPTH)

    # F5 (on Top) → F7 (join)
    with BuildSketch(Plane.XY):
        Circle(F5_R_2)
        Circle(F5_R, mode=Mode.SUBTRACT)
        Circle(F5_R)
    extrude(amount=-F7_DEPTH)


with BuildPart() as f9:
    # F0 (on Top) → F9 (new body)
    with BuildSketch(Plane.XY):
        with BuildLine():
            ThreePointArc((-0.0084213893, 10.9999967764), (-2, 10.8166538264), (-3.9254629082, 10.2757355433))
            ThreePointArc((-3.9254629082, 10.2757355433), (-1.7269851803, 8.8353757267), (0, 10.8166538264))
            ThreePointArc((0, 10.8166538264), (-0.0021064566, 10.9084219542), (-0.0084213893, 10.9999967764))
        make_face()
        with BuildLine():
            ThreePointArc((-0.0084213893, 10.9999967764), (-2.3636363636, 12.7833181585), (-3.9254629082, 10.2757355433))
            ThreePointArc((-3.9254629082, 10.2757355433), (-2, 10.8166538264), (-0.0084213893, 10.9999967764))
        make_face()
    extrude(amount=-F9_DEPTH)

    # F10
    f10_edges = [f9.edges().sort_by_distance(p)[0] for p in [
        (-4, 10.816654, 0),
    ]]
    fillet(f10_edges, radius=F10_R)


with BuildPart() as f9_1:
    # F11: moved
    add(f9.part.moved(Location((0, 0, -2))))


solid = Compound([f1.part, f4.part, f6.part, f9_1.part])
